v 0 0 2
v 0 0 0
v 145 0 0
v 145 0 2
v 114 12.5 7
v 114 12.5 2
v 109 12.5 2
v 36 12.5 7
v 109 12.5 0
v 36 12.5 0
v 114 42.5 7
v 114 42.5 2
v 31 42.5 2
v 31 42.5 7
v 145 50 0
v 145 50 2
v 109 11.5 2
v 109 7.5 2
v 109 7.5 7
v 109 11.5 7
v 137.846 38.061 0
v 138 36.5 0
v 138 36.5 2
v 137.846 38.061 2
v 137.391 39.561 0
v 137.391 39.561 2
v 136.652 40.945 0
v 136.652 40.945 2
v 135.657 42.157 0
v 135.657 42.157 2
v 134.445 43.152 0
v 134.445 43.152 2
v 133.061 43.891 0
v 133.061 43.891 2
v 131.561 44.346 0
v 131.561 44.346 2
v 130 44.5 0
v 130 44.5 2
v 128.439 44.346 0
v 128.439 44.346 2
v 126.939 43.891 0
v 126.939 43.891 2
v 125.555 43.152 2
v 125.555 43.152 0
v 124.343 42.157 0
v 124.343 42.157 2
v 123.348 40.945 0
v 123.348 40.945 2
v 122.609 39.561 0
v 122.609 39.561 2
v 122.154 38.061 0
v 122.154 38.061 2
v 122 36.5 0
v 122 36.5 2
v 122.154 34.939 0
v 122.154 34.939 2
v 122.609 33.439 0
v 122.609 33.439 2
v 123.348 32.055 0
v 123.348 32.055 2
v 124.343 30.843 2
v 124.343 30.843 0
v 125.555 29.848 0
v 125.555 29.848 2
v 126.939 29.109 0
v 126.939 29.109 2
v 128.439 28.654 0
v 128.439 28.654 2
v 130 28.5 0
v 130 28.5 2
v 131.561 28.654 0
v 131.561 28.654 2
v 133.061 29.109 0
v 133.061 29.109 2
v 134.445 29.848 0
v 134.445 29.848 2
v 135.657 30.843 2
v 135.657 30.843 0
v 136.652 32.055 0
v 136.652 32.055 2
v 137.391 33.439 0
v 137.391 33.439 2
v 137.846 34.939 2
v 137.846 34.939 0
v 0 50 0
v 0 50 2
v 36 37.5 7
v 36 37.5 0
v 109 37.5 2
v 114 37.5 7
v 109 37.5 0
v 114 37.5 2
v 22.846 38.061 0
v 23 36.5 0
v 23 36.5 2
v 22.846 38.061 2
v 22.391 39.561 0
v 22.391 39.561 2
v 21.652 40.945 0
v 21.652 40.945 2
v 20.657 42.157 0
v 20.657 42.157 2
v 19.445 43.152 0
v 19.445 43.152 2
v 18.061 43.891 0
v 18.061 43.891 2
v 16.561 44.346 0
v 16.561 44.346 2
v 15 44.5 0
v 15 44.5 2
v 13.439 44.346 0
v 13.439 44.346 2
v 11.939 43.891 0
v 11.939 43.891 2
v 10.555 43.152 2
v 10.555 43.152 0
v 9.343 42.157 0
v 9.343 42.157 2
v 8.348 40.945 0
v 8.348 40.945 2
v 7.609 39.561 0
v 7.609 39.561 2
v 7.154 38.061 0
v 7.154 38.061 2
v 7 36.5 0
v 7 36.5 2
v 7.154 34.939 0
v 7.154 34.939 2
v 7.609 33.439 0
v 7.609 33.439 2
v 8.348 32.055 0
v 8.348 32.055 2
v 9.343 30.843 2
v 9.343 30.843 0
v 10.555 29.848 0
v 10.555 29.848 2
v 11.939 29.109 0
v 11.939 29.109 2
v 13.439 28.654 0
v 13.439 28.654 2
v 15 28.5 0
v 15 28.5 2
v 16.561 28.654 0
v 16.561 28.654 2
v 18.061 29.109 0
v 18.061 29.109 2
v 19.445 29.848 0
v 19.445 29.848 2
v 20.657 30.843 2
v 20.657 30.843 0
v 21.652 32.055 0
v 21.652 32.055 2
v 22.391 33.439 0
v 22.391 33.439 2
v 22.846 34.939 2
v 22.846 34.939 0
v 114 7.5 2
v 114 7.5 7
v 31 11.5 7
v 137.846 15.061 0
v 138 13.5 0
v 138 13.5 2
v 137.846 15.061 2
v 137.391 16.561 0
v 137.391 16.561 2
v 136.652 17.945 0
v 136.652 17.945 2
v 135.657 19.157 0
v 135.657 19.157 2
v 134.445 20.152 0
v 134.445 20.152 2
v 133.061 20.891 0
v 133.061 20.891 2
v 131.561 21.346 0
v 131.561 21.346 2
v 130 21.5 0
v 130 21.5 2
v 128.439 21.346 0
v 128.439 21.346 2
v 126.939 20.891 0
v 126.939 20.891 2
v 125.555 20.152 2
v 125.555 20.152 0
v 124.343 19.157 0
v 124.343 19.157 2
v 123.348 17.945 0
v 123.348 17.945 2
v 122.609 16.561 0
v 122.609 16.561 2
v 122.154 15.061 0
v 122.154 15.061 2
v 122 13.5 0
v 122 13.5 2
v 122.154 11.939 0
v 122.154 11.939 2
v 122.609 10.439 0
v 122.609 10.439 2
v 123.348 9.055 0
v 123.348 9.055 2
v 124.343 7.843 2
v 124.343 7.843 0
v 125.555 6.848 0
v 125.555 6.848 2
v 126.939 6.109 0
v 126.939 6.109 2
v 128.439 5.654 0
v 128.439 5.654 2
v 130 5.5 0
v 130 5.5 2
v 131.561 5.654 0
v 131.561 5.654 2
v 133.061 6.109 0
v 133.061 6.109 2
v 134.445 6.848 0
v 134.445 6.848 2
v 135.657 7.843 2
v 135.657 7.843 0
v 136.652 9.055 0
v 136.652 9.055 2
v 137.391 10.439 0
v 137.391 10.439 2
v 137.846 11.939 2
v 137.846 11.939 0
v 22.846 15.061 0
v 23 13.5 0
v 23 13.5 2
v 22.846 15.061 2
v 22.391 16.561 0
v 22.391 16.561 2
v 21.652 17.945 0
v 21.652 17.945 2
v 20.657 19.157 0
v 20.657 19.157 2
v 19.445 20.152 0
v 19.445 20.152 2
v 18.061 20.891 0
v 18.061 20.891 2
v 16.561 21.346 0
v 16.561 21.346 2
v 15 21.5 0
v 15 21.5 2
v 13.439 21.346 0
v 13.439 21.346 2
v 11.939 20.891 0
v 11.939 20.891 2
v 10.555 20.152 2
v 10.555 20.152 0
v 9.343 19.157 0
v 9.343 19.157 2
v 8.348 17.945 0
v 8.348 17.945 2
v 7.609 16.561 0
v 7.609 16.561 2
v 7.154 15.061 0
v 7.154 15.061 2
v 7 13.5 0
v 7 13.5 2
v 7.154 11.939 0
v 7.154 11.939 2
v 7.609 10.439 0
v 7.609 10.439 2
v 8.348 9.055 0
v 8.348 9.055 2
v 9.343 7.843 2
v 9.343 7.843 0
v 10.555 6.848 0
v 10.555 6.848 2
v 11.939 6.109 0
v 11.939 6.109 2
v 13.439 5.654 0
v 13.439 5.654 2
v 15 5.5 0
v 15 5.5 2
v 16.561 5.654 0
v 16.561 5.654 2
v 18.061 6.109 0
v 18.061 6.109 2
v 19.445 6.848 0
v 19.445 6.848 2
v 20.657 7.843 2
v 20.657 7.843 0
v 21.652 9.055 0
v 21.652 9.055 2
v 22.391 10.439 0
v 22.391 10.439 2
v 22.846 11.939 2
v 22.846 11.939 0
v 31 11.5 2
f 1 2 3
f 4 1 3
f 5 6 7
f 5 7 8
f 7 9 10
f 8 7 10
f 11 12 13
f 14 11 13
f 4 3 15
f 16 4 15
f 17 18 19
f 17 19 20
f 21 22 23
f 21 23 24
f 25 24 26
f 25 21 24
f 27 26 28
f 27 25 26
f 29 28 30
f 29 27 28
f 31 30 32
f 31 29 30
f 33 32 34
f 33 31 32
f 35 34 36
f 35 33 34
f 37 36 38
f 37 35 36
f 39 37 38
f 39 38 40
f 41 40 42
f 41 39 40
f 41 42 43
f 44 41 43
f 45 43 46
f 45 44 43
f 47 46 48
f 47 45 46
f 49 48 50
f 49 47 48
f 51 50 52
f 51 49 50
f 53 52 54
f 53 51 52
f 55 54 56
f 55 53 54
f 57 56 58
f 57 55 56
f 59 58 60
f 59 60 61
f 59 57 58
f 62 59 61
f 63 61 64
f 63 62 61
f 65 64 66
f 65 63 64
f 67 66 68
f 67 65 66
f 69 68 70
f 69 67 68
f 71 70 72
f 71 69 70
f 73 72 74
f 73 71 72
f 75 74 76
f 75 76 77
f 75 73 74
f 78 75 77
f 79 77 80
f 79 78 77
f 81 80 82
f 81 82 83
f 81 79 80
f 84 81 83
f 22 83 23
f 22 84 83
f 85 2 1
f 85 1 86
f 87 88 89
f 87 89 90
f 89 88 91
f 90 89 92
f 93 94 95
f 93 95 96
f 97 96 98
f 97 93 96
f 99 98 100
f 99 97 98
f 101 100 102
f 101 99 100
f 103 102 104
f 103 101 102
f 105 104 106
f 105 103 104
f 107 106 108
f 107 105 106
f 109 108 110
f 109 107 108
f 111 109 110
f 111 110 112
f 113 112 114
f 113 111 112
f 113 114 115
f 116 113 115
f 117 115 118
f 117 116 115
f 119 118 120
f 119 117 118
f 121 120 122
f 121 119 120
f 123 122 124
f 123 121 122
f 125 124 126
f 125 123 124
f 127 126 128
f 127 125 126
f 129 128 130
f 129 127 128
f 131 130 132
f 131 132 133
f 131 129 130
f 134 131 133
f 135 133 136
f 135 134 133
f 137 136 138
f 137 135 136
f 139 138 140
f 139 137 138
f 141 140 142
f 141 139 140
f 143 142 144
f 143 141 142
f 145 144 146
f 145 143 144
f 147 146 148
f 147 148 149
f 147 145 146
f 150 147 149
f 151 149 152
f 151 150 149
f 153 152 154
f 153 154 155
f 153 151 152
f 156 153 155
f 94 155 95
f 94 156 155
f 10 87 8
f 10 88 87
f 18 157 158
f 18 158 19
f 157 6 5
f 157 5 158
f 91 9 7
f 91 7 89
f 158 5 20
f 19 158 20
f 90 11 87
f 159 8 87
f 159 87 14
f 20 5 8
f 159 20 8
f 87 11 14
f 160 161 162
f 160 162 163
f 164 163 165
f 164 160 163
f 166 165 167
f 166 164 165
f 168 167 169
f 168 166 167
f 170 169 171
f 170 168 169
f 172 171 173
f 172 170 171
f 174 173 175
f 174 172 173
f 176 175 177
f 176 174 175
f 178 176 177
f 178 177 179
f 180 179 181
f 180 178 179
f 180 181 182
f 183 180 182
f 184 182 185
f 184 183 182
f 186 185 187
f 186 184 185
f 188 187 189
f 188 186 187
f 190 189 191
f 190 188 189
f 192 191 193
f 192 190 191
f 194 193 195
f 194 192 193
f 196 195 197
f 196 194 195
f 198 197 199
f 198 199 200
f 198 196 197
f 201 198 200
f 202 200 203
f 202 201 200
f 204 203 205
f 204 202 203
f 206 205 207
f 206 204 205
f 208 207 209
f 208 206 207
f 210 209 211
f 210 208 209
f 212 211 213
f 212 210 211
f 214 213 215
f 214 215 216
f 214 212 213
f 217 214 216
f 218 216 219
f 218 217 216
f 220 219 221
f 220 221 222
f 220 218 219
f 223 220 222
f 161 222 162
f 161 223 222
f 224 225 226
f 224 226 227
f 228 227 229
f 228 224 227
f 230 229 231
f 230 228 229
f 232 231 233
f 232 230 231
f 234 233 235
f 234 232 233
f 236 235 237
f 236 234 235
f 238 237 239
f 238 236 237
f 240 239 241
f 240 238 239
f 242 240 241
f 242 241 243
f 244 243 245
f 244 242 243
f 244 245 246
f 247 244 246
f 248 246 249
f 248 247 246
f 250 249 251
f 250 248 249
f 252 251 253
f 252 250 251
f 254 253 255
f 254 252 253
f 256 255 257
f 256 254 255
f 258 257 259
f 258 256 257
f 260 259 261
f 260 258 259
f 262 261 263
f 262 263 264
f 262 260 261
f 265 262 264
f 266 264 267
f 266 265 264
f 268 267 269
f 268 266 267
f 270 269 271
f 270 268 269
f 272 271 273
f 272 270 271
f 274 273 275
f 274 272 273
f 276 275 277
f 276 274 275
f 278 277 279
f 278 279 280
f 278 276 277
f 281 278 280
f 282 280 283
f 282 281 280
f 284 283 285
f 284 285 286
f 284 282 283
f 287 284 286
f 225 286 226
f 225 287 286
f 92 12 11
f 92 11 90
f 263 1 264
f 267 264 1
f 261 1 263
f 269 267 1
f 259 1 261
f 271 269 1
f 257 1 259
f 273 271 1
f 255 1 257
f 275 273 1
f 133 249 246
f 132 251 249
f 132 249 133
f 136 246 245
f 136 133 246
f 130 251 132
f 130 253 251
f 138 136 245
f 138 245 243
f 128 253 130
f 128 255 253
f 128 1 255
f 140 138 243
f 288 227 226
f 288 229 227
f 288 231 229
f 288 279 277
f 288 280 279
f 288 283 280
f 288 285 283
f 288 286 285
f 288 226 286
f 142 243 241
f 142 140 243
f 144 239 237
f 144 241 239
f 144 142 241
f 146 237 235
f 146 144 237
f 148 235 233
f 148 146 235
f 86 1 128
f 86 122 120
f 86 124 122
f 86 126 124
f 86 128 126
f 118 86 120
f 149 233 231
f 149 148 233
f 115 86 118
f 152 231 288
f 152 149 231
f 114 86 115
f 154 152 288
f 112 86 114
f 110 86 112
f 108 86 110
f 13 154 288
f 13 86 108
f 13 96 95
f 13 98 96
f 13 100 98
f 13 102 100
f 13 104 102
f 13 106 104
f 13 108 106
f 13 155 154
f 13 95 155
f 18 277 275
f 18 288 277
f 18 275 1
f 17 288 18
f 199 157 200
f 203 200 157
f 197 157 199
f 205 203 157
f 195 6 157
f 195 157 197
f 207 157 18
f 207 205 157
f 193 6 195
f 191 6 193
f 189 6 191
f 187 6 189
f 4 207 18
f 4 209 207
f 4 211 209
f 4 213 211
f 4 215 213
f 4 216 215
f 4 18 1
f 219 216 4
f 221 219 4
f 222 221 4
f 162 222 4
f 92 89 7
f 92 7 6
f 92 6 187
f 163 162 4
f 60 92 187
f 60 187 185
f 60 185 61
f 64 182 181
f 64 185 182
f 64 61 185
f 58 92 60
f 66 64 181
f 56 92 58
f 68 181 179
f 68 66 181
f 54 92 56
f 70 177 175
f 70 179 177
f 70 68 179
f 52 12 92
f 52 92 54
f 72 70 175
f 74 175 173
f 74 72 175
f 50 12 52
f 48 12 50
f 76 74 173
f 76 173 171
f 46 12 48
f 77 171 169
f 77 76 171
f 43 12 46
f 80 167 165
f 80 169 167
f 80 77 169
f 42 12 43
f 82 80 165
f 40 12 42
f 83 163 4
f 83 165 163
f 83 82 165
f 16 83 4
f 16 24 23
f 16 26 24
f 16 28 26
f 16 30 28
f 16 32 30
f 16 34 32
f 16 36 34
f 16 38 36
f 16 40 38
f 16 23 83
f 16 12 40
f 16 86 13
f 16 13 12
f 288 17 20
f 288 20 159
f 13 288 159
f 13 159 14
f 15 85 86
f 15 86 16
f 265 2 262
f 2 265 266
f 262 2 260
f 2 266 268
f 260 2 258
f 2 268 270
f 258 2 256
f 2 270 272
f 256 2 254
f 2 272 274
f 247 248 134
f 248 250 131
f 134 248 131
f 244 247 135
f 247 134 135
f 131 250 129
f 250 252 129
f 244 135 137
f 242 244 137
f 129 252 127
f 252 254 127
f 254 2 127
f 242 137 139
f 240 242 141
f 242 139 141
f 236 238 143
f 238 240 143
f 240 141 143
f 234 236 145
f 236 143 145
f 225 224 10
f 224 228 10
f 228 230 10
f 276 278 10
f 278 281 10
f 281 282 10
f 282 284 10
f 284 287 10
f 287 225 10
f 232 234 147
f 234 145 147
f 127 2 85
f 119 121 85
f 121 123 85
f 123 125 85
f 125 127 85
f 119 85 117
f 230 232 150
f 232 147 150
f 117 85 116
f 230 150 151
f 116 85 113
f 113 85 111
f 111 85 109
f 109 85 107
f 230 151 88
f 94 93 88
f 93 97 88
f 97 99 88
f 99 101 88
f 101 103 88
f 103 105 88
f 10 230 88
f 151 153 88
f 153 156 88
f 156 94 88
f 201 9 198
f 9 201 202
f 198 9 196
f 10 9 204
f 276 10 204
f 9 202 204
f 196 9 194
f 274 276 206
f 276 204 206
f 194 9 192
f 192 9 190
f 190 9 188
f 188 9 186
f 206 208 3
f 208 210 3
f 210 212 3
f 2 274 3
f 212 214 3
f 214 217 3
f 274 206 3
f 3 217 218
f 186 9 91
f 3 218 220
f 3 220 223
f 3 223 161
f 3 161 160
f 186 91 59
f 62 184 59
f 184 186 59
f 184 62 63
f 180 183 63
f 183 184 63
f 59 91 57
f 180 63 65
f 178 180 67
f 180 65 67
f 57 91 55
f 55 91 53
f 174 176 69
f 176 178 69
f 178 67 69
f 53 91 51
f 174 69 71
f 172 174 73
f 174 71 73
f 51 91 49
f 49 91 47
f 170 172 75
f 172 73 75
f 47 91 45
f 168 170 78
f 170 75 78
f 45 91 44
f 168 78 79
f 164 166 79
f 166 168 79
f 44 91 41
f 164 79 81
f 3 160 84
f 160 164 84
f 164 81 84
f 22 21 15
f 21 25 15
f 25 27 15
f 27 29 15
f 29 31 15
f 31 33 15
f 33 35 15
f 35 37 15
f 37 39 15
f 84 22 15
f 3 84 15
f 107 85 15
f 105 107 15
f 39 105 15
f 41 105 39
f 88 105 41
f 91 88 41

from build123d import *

# Parameters (mm, degrees)
SKETCH_W     = 145
SKETCH_H     = 50
SKETCH_R     = 8
SKETCH_W_2   = 73
SKETCH_H_2   = 25
PAD_DEPTH    = 2
PAD001_DEPTH = 5


with BuildPart() as part:
    # Sketch → Pad (new body)
    with BuildSketch(Plane.XY):
        with Locations((72.5, 25)):
            Rectangle(SKETCH_W, SKETCH_H)
        with Locations((15, 13.5)):
            Circle(SKETCH_R, mode=Mode.SUBTRACT)
        with Locations((15, 36.5)):
            Circle(SKETCH_R, mode=Mode.SUBTRACT)
        with Locations((130, 13.5)):
            Circle(SKETCH_R, mode=Mode.SUBTRACT)
        with Locations((130, 36.5)):
            Circle(SKETCH_R, mode=Mode.SUBTRACT)
        with Locations((72.5, 25)):
            Rectangle(SKETCH_W_2, SKETCH_H_2, mode=Mode.SUBTRACT)
    extrude(amount=PAD_DEPTH)

    # Sketch001 (on Face14 of Pad) → Pad001 (join)
    with BuildSketch(Plane.XY.offset(2)):
        Polygon((36, 12.5), (109, 12.5), (114, 12.5), (114, 7.5), (109, 7.5), (109, 11.5), (31, 11.5), (31, 42.5), (109, 42.5), (114, 42.5), (114, 37.5), (109, 37.5), (36, 37.5), align=None)
    extrude(amount=PAD001_DEPTH)


solid = part.part
